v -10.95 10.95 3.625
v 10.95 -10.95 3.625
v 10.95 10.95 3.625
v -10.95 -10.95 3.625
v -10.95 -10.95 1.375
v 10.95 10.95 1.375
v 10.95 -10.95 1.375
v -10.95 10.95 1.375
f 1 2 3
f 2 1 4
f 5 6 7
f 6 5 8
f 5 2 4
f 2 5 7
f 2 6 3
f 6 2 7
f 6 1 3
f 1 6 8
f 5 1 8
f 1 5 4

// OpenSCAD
module tafl(size, baseSize, railSize, numSquares){//size in mm
    echo("generating board of size: ", size, " units with ", numSquares, " squares");
    
    //generate base
    cube(size=[size, size, baseSize], center=true);
    
    //generate the cross hatches
    for(i = [0:numSquares]){
        //figure out translation
        crossHatch(size, baseSize, railSize, numSquares, i);
        rotate([0,0,90]){
            crossHatch(size, baseSize, railSize, numSquares, i);
        }
    }
}

module crossHatch(size, baseSize, railSize, numSquares, i){
    remainingSize = size -  baseSize;
    translate([
            -size/2,
            //size / numSquares * i - size/2 + 0.1, //have to add the line thickness (0.1)
            remainingSize / numSquares * i - size/2,
            0
        ]){
            cube(size=[size, baseSize, railSize], center=false);
        }
}

//generators for special colored squares
module squareFill(size, numSquares, borderThickness, railSize){
    echo("square fill x/y: ", size / numSquares - borderThickness -0.25)
    echo("square fill z: ", railSize - borderThickness/2);
    cube([
        size / numSquares - borderThickness -1,
        size / numSquares - borderThickness -1,
        railSize - borderThickness/2
    ], center=true);
}

//generators
module brandubh(size, baseSize, railSize){
    echo("8 attackers");
    echo("4 defenders, 1 king");
    tafl(size, baseSize, railSize, 7);
}

module gwddbwyll(size, baseSize, railSize){
    echo("8 attackers");
    echo("4 defenders, 1 king");
    tafl(size, baseSize, railSize, 7);
}

module fidchell(size, baseSize, railSize){
    echo("16 attackers");
    echo("8 defenders, 1 king");
    tafl(size, baseSize, railSize, 7);
}

module ardRi(size, baseSize, railSize){
    echo("16 attackers");
    echo("8 defenders, 1 king");
    tafl(size, baseSize, railSize, 7);
}

module tablut(size, baseSize, railSize){
    echo("16 attackers");
    echo("8 defenders, 1 king");
    tafl(size, baseSize, railSize, 9);
}

module tawlbwrdd(size, baseSize, railSize){
    echo("24 attackers");
    echo("12 defenders, 1 king");
    tafl(size, baseSize, railSize, 11);
}

module hnefatafl(size, baseSize, railSize){
    echo("24 attackers");
    echo("12 defenders, 1 king");
    tafl(size, baseSize, railSize, 11);
}

module largeHnefatafl(size, baseSize, railSize){
    echo("24 attackers");
    echo("12 defenders, 1 king");
    tafl(size, baseSize, railSize, 13);
}

module aleaEvangelii(size, baseSize, railSize){
    echo("48 attackers");
    echo("24 defenders, 1 king");
    tafl(size, baseSize, railSize, 19);
}


translate([0,0,2.5]){
    squareFill(177.8,7,2.5,3.5);
}
//brandubh(177.8, 2.5, 3.5);
